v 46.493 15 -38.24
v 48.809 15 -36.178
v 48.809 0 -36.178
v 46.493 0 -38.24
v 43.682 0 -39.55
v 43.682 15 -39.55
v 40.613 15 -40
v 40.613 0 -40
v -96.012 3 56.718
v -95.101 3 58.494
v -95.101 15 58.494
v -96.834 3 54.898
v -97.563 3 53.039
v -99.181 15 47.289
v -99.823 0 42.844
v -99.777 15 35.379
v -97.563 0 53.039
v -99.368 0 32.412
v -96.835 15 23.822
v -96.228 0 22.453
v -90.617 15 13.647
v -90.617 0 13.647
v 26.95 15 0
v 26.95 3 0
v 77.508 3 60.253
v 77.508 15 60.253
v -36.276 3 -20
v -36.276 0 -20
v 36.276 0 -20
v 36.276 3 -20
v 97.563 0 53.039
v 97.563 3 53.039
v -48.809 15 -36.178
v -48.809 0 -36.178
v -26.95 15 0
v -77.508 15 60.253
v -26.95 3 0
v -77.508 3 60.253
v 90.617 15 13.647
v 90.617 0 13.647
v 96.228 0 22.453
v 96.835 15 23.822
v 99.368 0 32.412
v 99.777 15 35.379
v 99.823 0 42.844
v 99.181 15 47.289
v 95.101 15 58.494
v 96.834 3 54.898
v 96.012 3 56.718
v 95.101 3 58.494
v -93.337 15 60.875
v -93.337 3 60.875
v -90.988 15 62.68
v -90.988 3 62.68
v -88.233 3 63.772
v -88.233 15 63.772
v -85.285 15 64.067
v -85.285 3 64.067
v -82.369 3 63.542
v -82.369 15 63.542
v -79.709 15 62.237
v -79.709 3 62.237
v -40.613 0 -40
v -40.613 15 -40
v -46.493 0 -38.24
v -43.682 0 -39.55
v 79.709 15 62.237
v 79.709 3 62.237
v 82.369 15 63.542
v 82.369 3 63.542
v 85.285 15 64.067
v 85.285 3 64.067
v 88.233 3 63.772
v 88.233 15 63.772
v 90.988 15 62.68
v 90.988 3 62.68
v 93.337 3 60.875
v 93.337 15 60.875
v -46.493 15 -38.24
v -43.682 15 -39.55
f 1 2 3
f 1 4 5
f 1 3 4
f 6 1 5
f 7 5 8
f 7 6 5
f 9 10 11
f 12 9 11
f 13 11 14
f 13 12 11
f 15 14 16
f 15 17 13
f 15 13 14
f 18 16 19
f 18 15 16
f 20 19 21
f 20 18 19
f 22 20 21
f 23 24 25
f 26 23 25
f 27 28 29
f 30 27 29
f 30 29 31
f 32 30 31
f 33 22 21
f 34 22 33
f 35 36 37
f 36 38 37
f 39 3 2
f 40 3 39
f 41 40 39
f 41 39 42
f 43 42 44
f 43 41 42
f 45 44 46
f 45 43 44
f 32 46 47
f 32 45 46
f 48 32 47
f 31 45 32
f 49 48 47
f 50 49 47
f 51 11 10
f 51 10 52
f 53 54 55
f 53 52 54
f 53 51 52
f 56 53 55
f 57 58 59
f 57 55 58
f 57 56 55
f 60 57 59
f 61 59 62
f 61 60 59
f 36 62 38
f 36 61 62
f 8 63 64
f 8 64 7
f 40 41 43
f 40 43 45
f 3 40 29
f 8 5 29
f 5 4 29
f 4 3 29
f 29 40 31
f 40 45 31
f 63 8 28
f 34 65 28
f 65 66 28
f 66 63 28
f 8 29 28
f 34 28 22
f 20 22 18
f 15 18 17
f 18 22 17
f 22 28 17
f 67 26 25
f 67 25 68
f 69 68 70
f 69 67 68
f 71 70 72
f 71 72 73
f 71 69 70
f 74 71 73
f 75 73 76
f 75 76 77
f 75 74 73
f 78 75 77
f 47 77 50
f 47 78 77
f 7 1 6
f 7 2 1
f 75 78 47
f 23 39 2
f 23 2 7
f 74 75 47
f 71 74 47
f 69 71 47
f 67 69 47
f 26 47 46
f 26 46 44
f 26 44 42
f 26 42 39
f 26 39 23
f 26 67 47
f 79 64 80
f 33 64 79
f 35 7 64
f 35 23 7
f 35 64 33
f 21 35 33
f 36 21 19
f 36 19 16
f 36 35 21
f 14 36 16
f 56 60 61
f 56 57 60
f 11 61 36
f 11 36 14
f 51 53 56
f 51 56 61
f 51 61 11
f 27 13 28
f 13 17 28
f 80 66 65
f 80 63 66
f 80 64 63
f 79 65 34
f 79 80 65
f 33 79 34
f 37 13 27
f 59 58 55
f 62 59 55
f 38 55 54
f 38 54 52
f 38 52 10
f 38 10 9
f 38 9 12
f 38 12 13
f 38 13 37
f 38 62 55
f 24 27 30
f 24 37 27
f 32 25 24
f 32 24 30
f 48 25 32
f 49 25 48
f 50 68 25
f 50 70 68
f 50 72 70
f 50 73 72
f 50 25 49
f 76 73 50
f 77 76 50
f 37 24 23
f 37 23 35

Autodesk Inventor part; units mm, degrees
ref_plane "YZ Plane" through (0, 0, 0) normal (1, 0, 0) x (0, 1, 0)
ref_plane "XZ Plane" through (0, 0, 0) normal (0, 1, 0) x (-1, 0, 0)
ref_plane "XY Plane" through (0, 0, 0) normal (0, 0, 1) x (1, 0, 0)
sketch "Sketch1" plane through (0, 0, 0) normal (0, 1, 0) x (-1, 0, 0)
  line L0 (-26.95, 0) -> (26.95, 0)
  line L1 (-26.95, 0) -> (-85.687, 70)
  line L2 (85.687, 70) -> (26.95, 0)
  line L3 (90.6172, 13.6467) -> (45.6023, -40)
  line L4 (45.6023, -40) -> (-45.6023, -40)
  line L5 (-45.6023, -40) -> (-90.6172, 13.6467)
  line L6 (0, 0) -> (0, -40) construction
  arc A0 (90.6172, 13.6467) -> (85.687, 70) centre (59.9755, 39.3582) ccw
  arc A1 (-85.687, 70) -> (-90.6172, 13.6467) centre (-59.9755, 39.3582) ccw
  point P0 (0, 70)
  dimension "d1" = 53.9
  dimension "d3" = 40
  dimension "d5" = 40
  dimension "d16" = 130
  dimension "d17" = 70
extrude "Extrusion1" add sketch "Sketch1" along normal blind 15
sketch "Sketch2" plane through (0, 0, 0) normal (0, -1, 0) x (1, 0, 0)
  line L0 (-26.95, 0) -> (26.95, 0) projected
  line L1 (-85.687, 70) -> (-26.95, 0) projected
  line L2 (-45.6023, -40) -> (-90.6172, 13.6467) construction
  line L3 (45.6023, -40) -> (-45.6023, -40) construction
  line L4 (90.6172, 13.6467) -> (45.6023, -40) construction
  line L5 (26.95, 0) -> (85.687, 70) projected
  line L6 (-97.5632, 53.039) -> (-36.2762, -20)
  line L7 (-36.2762, -20) -> (36.2762, -20)
  line L8 (36.2762, -20) -> (97.5632, 53.039)
  line L9 (-85.687, 70) -> (-26.95, 0) projected
  line L10 (26.95, 0) -> (85.687, 70) projected
  arc A0 (-85.687, 70) -> (-90.6172, 13.6467) centre (-59.9755, 39.3582) ccw projected
  arc A1 (90.6172, 13.6467) -> (85.687, 70) centre (59.9755, 39.3582) ccw projected
  point P0 (0, 0)
  dimension "d8" = 20
  dimension "d9" = 20
  dimension "d10" = 20
extrude "Extrusion2" cut sketch "Sketch2" against normal blind 3
fillet "Fillet1" radius 10.7 4 edges at (-85.687, 9, 70) (85.687, 9, 70) (-45.6023, 7.5, -40) (45.6023, 7.5, -40)
equation "\"d5\" = d3"
equation "\"d16\" = Лоток_угол"
equation "\"d9\" = d8"
equation "\"d10\" = d8"
equation "\"BendRadius\" = Thickness"
equation "\"BendReliefWidth\" = Thickness"
equation "\"BendReliefDepth\" = 0.5 * Thickness"
equation "\"TransitionRadius\" = BendRadius"
equation "\"JacobiRadiusSize\" = BendRadius"
equation "\"GapSize\" = Thickness"
equation "\"Лоток_угол\" = 130deg"
equation "\"Thickness\" = 15"
properties part number "ДМФ 033 держатель лотка"
